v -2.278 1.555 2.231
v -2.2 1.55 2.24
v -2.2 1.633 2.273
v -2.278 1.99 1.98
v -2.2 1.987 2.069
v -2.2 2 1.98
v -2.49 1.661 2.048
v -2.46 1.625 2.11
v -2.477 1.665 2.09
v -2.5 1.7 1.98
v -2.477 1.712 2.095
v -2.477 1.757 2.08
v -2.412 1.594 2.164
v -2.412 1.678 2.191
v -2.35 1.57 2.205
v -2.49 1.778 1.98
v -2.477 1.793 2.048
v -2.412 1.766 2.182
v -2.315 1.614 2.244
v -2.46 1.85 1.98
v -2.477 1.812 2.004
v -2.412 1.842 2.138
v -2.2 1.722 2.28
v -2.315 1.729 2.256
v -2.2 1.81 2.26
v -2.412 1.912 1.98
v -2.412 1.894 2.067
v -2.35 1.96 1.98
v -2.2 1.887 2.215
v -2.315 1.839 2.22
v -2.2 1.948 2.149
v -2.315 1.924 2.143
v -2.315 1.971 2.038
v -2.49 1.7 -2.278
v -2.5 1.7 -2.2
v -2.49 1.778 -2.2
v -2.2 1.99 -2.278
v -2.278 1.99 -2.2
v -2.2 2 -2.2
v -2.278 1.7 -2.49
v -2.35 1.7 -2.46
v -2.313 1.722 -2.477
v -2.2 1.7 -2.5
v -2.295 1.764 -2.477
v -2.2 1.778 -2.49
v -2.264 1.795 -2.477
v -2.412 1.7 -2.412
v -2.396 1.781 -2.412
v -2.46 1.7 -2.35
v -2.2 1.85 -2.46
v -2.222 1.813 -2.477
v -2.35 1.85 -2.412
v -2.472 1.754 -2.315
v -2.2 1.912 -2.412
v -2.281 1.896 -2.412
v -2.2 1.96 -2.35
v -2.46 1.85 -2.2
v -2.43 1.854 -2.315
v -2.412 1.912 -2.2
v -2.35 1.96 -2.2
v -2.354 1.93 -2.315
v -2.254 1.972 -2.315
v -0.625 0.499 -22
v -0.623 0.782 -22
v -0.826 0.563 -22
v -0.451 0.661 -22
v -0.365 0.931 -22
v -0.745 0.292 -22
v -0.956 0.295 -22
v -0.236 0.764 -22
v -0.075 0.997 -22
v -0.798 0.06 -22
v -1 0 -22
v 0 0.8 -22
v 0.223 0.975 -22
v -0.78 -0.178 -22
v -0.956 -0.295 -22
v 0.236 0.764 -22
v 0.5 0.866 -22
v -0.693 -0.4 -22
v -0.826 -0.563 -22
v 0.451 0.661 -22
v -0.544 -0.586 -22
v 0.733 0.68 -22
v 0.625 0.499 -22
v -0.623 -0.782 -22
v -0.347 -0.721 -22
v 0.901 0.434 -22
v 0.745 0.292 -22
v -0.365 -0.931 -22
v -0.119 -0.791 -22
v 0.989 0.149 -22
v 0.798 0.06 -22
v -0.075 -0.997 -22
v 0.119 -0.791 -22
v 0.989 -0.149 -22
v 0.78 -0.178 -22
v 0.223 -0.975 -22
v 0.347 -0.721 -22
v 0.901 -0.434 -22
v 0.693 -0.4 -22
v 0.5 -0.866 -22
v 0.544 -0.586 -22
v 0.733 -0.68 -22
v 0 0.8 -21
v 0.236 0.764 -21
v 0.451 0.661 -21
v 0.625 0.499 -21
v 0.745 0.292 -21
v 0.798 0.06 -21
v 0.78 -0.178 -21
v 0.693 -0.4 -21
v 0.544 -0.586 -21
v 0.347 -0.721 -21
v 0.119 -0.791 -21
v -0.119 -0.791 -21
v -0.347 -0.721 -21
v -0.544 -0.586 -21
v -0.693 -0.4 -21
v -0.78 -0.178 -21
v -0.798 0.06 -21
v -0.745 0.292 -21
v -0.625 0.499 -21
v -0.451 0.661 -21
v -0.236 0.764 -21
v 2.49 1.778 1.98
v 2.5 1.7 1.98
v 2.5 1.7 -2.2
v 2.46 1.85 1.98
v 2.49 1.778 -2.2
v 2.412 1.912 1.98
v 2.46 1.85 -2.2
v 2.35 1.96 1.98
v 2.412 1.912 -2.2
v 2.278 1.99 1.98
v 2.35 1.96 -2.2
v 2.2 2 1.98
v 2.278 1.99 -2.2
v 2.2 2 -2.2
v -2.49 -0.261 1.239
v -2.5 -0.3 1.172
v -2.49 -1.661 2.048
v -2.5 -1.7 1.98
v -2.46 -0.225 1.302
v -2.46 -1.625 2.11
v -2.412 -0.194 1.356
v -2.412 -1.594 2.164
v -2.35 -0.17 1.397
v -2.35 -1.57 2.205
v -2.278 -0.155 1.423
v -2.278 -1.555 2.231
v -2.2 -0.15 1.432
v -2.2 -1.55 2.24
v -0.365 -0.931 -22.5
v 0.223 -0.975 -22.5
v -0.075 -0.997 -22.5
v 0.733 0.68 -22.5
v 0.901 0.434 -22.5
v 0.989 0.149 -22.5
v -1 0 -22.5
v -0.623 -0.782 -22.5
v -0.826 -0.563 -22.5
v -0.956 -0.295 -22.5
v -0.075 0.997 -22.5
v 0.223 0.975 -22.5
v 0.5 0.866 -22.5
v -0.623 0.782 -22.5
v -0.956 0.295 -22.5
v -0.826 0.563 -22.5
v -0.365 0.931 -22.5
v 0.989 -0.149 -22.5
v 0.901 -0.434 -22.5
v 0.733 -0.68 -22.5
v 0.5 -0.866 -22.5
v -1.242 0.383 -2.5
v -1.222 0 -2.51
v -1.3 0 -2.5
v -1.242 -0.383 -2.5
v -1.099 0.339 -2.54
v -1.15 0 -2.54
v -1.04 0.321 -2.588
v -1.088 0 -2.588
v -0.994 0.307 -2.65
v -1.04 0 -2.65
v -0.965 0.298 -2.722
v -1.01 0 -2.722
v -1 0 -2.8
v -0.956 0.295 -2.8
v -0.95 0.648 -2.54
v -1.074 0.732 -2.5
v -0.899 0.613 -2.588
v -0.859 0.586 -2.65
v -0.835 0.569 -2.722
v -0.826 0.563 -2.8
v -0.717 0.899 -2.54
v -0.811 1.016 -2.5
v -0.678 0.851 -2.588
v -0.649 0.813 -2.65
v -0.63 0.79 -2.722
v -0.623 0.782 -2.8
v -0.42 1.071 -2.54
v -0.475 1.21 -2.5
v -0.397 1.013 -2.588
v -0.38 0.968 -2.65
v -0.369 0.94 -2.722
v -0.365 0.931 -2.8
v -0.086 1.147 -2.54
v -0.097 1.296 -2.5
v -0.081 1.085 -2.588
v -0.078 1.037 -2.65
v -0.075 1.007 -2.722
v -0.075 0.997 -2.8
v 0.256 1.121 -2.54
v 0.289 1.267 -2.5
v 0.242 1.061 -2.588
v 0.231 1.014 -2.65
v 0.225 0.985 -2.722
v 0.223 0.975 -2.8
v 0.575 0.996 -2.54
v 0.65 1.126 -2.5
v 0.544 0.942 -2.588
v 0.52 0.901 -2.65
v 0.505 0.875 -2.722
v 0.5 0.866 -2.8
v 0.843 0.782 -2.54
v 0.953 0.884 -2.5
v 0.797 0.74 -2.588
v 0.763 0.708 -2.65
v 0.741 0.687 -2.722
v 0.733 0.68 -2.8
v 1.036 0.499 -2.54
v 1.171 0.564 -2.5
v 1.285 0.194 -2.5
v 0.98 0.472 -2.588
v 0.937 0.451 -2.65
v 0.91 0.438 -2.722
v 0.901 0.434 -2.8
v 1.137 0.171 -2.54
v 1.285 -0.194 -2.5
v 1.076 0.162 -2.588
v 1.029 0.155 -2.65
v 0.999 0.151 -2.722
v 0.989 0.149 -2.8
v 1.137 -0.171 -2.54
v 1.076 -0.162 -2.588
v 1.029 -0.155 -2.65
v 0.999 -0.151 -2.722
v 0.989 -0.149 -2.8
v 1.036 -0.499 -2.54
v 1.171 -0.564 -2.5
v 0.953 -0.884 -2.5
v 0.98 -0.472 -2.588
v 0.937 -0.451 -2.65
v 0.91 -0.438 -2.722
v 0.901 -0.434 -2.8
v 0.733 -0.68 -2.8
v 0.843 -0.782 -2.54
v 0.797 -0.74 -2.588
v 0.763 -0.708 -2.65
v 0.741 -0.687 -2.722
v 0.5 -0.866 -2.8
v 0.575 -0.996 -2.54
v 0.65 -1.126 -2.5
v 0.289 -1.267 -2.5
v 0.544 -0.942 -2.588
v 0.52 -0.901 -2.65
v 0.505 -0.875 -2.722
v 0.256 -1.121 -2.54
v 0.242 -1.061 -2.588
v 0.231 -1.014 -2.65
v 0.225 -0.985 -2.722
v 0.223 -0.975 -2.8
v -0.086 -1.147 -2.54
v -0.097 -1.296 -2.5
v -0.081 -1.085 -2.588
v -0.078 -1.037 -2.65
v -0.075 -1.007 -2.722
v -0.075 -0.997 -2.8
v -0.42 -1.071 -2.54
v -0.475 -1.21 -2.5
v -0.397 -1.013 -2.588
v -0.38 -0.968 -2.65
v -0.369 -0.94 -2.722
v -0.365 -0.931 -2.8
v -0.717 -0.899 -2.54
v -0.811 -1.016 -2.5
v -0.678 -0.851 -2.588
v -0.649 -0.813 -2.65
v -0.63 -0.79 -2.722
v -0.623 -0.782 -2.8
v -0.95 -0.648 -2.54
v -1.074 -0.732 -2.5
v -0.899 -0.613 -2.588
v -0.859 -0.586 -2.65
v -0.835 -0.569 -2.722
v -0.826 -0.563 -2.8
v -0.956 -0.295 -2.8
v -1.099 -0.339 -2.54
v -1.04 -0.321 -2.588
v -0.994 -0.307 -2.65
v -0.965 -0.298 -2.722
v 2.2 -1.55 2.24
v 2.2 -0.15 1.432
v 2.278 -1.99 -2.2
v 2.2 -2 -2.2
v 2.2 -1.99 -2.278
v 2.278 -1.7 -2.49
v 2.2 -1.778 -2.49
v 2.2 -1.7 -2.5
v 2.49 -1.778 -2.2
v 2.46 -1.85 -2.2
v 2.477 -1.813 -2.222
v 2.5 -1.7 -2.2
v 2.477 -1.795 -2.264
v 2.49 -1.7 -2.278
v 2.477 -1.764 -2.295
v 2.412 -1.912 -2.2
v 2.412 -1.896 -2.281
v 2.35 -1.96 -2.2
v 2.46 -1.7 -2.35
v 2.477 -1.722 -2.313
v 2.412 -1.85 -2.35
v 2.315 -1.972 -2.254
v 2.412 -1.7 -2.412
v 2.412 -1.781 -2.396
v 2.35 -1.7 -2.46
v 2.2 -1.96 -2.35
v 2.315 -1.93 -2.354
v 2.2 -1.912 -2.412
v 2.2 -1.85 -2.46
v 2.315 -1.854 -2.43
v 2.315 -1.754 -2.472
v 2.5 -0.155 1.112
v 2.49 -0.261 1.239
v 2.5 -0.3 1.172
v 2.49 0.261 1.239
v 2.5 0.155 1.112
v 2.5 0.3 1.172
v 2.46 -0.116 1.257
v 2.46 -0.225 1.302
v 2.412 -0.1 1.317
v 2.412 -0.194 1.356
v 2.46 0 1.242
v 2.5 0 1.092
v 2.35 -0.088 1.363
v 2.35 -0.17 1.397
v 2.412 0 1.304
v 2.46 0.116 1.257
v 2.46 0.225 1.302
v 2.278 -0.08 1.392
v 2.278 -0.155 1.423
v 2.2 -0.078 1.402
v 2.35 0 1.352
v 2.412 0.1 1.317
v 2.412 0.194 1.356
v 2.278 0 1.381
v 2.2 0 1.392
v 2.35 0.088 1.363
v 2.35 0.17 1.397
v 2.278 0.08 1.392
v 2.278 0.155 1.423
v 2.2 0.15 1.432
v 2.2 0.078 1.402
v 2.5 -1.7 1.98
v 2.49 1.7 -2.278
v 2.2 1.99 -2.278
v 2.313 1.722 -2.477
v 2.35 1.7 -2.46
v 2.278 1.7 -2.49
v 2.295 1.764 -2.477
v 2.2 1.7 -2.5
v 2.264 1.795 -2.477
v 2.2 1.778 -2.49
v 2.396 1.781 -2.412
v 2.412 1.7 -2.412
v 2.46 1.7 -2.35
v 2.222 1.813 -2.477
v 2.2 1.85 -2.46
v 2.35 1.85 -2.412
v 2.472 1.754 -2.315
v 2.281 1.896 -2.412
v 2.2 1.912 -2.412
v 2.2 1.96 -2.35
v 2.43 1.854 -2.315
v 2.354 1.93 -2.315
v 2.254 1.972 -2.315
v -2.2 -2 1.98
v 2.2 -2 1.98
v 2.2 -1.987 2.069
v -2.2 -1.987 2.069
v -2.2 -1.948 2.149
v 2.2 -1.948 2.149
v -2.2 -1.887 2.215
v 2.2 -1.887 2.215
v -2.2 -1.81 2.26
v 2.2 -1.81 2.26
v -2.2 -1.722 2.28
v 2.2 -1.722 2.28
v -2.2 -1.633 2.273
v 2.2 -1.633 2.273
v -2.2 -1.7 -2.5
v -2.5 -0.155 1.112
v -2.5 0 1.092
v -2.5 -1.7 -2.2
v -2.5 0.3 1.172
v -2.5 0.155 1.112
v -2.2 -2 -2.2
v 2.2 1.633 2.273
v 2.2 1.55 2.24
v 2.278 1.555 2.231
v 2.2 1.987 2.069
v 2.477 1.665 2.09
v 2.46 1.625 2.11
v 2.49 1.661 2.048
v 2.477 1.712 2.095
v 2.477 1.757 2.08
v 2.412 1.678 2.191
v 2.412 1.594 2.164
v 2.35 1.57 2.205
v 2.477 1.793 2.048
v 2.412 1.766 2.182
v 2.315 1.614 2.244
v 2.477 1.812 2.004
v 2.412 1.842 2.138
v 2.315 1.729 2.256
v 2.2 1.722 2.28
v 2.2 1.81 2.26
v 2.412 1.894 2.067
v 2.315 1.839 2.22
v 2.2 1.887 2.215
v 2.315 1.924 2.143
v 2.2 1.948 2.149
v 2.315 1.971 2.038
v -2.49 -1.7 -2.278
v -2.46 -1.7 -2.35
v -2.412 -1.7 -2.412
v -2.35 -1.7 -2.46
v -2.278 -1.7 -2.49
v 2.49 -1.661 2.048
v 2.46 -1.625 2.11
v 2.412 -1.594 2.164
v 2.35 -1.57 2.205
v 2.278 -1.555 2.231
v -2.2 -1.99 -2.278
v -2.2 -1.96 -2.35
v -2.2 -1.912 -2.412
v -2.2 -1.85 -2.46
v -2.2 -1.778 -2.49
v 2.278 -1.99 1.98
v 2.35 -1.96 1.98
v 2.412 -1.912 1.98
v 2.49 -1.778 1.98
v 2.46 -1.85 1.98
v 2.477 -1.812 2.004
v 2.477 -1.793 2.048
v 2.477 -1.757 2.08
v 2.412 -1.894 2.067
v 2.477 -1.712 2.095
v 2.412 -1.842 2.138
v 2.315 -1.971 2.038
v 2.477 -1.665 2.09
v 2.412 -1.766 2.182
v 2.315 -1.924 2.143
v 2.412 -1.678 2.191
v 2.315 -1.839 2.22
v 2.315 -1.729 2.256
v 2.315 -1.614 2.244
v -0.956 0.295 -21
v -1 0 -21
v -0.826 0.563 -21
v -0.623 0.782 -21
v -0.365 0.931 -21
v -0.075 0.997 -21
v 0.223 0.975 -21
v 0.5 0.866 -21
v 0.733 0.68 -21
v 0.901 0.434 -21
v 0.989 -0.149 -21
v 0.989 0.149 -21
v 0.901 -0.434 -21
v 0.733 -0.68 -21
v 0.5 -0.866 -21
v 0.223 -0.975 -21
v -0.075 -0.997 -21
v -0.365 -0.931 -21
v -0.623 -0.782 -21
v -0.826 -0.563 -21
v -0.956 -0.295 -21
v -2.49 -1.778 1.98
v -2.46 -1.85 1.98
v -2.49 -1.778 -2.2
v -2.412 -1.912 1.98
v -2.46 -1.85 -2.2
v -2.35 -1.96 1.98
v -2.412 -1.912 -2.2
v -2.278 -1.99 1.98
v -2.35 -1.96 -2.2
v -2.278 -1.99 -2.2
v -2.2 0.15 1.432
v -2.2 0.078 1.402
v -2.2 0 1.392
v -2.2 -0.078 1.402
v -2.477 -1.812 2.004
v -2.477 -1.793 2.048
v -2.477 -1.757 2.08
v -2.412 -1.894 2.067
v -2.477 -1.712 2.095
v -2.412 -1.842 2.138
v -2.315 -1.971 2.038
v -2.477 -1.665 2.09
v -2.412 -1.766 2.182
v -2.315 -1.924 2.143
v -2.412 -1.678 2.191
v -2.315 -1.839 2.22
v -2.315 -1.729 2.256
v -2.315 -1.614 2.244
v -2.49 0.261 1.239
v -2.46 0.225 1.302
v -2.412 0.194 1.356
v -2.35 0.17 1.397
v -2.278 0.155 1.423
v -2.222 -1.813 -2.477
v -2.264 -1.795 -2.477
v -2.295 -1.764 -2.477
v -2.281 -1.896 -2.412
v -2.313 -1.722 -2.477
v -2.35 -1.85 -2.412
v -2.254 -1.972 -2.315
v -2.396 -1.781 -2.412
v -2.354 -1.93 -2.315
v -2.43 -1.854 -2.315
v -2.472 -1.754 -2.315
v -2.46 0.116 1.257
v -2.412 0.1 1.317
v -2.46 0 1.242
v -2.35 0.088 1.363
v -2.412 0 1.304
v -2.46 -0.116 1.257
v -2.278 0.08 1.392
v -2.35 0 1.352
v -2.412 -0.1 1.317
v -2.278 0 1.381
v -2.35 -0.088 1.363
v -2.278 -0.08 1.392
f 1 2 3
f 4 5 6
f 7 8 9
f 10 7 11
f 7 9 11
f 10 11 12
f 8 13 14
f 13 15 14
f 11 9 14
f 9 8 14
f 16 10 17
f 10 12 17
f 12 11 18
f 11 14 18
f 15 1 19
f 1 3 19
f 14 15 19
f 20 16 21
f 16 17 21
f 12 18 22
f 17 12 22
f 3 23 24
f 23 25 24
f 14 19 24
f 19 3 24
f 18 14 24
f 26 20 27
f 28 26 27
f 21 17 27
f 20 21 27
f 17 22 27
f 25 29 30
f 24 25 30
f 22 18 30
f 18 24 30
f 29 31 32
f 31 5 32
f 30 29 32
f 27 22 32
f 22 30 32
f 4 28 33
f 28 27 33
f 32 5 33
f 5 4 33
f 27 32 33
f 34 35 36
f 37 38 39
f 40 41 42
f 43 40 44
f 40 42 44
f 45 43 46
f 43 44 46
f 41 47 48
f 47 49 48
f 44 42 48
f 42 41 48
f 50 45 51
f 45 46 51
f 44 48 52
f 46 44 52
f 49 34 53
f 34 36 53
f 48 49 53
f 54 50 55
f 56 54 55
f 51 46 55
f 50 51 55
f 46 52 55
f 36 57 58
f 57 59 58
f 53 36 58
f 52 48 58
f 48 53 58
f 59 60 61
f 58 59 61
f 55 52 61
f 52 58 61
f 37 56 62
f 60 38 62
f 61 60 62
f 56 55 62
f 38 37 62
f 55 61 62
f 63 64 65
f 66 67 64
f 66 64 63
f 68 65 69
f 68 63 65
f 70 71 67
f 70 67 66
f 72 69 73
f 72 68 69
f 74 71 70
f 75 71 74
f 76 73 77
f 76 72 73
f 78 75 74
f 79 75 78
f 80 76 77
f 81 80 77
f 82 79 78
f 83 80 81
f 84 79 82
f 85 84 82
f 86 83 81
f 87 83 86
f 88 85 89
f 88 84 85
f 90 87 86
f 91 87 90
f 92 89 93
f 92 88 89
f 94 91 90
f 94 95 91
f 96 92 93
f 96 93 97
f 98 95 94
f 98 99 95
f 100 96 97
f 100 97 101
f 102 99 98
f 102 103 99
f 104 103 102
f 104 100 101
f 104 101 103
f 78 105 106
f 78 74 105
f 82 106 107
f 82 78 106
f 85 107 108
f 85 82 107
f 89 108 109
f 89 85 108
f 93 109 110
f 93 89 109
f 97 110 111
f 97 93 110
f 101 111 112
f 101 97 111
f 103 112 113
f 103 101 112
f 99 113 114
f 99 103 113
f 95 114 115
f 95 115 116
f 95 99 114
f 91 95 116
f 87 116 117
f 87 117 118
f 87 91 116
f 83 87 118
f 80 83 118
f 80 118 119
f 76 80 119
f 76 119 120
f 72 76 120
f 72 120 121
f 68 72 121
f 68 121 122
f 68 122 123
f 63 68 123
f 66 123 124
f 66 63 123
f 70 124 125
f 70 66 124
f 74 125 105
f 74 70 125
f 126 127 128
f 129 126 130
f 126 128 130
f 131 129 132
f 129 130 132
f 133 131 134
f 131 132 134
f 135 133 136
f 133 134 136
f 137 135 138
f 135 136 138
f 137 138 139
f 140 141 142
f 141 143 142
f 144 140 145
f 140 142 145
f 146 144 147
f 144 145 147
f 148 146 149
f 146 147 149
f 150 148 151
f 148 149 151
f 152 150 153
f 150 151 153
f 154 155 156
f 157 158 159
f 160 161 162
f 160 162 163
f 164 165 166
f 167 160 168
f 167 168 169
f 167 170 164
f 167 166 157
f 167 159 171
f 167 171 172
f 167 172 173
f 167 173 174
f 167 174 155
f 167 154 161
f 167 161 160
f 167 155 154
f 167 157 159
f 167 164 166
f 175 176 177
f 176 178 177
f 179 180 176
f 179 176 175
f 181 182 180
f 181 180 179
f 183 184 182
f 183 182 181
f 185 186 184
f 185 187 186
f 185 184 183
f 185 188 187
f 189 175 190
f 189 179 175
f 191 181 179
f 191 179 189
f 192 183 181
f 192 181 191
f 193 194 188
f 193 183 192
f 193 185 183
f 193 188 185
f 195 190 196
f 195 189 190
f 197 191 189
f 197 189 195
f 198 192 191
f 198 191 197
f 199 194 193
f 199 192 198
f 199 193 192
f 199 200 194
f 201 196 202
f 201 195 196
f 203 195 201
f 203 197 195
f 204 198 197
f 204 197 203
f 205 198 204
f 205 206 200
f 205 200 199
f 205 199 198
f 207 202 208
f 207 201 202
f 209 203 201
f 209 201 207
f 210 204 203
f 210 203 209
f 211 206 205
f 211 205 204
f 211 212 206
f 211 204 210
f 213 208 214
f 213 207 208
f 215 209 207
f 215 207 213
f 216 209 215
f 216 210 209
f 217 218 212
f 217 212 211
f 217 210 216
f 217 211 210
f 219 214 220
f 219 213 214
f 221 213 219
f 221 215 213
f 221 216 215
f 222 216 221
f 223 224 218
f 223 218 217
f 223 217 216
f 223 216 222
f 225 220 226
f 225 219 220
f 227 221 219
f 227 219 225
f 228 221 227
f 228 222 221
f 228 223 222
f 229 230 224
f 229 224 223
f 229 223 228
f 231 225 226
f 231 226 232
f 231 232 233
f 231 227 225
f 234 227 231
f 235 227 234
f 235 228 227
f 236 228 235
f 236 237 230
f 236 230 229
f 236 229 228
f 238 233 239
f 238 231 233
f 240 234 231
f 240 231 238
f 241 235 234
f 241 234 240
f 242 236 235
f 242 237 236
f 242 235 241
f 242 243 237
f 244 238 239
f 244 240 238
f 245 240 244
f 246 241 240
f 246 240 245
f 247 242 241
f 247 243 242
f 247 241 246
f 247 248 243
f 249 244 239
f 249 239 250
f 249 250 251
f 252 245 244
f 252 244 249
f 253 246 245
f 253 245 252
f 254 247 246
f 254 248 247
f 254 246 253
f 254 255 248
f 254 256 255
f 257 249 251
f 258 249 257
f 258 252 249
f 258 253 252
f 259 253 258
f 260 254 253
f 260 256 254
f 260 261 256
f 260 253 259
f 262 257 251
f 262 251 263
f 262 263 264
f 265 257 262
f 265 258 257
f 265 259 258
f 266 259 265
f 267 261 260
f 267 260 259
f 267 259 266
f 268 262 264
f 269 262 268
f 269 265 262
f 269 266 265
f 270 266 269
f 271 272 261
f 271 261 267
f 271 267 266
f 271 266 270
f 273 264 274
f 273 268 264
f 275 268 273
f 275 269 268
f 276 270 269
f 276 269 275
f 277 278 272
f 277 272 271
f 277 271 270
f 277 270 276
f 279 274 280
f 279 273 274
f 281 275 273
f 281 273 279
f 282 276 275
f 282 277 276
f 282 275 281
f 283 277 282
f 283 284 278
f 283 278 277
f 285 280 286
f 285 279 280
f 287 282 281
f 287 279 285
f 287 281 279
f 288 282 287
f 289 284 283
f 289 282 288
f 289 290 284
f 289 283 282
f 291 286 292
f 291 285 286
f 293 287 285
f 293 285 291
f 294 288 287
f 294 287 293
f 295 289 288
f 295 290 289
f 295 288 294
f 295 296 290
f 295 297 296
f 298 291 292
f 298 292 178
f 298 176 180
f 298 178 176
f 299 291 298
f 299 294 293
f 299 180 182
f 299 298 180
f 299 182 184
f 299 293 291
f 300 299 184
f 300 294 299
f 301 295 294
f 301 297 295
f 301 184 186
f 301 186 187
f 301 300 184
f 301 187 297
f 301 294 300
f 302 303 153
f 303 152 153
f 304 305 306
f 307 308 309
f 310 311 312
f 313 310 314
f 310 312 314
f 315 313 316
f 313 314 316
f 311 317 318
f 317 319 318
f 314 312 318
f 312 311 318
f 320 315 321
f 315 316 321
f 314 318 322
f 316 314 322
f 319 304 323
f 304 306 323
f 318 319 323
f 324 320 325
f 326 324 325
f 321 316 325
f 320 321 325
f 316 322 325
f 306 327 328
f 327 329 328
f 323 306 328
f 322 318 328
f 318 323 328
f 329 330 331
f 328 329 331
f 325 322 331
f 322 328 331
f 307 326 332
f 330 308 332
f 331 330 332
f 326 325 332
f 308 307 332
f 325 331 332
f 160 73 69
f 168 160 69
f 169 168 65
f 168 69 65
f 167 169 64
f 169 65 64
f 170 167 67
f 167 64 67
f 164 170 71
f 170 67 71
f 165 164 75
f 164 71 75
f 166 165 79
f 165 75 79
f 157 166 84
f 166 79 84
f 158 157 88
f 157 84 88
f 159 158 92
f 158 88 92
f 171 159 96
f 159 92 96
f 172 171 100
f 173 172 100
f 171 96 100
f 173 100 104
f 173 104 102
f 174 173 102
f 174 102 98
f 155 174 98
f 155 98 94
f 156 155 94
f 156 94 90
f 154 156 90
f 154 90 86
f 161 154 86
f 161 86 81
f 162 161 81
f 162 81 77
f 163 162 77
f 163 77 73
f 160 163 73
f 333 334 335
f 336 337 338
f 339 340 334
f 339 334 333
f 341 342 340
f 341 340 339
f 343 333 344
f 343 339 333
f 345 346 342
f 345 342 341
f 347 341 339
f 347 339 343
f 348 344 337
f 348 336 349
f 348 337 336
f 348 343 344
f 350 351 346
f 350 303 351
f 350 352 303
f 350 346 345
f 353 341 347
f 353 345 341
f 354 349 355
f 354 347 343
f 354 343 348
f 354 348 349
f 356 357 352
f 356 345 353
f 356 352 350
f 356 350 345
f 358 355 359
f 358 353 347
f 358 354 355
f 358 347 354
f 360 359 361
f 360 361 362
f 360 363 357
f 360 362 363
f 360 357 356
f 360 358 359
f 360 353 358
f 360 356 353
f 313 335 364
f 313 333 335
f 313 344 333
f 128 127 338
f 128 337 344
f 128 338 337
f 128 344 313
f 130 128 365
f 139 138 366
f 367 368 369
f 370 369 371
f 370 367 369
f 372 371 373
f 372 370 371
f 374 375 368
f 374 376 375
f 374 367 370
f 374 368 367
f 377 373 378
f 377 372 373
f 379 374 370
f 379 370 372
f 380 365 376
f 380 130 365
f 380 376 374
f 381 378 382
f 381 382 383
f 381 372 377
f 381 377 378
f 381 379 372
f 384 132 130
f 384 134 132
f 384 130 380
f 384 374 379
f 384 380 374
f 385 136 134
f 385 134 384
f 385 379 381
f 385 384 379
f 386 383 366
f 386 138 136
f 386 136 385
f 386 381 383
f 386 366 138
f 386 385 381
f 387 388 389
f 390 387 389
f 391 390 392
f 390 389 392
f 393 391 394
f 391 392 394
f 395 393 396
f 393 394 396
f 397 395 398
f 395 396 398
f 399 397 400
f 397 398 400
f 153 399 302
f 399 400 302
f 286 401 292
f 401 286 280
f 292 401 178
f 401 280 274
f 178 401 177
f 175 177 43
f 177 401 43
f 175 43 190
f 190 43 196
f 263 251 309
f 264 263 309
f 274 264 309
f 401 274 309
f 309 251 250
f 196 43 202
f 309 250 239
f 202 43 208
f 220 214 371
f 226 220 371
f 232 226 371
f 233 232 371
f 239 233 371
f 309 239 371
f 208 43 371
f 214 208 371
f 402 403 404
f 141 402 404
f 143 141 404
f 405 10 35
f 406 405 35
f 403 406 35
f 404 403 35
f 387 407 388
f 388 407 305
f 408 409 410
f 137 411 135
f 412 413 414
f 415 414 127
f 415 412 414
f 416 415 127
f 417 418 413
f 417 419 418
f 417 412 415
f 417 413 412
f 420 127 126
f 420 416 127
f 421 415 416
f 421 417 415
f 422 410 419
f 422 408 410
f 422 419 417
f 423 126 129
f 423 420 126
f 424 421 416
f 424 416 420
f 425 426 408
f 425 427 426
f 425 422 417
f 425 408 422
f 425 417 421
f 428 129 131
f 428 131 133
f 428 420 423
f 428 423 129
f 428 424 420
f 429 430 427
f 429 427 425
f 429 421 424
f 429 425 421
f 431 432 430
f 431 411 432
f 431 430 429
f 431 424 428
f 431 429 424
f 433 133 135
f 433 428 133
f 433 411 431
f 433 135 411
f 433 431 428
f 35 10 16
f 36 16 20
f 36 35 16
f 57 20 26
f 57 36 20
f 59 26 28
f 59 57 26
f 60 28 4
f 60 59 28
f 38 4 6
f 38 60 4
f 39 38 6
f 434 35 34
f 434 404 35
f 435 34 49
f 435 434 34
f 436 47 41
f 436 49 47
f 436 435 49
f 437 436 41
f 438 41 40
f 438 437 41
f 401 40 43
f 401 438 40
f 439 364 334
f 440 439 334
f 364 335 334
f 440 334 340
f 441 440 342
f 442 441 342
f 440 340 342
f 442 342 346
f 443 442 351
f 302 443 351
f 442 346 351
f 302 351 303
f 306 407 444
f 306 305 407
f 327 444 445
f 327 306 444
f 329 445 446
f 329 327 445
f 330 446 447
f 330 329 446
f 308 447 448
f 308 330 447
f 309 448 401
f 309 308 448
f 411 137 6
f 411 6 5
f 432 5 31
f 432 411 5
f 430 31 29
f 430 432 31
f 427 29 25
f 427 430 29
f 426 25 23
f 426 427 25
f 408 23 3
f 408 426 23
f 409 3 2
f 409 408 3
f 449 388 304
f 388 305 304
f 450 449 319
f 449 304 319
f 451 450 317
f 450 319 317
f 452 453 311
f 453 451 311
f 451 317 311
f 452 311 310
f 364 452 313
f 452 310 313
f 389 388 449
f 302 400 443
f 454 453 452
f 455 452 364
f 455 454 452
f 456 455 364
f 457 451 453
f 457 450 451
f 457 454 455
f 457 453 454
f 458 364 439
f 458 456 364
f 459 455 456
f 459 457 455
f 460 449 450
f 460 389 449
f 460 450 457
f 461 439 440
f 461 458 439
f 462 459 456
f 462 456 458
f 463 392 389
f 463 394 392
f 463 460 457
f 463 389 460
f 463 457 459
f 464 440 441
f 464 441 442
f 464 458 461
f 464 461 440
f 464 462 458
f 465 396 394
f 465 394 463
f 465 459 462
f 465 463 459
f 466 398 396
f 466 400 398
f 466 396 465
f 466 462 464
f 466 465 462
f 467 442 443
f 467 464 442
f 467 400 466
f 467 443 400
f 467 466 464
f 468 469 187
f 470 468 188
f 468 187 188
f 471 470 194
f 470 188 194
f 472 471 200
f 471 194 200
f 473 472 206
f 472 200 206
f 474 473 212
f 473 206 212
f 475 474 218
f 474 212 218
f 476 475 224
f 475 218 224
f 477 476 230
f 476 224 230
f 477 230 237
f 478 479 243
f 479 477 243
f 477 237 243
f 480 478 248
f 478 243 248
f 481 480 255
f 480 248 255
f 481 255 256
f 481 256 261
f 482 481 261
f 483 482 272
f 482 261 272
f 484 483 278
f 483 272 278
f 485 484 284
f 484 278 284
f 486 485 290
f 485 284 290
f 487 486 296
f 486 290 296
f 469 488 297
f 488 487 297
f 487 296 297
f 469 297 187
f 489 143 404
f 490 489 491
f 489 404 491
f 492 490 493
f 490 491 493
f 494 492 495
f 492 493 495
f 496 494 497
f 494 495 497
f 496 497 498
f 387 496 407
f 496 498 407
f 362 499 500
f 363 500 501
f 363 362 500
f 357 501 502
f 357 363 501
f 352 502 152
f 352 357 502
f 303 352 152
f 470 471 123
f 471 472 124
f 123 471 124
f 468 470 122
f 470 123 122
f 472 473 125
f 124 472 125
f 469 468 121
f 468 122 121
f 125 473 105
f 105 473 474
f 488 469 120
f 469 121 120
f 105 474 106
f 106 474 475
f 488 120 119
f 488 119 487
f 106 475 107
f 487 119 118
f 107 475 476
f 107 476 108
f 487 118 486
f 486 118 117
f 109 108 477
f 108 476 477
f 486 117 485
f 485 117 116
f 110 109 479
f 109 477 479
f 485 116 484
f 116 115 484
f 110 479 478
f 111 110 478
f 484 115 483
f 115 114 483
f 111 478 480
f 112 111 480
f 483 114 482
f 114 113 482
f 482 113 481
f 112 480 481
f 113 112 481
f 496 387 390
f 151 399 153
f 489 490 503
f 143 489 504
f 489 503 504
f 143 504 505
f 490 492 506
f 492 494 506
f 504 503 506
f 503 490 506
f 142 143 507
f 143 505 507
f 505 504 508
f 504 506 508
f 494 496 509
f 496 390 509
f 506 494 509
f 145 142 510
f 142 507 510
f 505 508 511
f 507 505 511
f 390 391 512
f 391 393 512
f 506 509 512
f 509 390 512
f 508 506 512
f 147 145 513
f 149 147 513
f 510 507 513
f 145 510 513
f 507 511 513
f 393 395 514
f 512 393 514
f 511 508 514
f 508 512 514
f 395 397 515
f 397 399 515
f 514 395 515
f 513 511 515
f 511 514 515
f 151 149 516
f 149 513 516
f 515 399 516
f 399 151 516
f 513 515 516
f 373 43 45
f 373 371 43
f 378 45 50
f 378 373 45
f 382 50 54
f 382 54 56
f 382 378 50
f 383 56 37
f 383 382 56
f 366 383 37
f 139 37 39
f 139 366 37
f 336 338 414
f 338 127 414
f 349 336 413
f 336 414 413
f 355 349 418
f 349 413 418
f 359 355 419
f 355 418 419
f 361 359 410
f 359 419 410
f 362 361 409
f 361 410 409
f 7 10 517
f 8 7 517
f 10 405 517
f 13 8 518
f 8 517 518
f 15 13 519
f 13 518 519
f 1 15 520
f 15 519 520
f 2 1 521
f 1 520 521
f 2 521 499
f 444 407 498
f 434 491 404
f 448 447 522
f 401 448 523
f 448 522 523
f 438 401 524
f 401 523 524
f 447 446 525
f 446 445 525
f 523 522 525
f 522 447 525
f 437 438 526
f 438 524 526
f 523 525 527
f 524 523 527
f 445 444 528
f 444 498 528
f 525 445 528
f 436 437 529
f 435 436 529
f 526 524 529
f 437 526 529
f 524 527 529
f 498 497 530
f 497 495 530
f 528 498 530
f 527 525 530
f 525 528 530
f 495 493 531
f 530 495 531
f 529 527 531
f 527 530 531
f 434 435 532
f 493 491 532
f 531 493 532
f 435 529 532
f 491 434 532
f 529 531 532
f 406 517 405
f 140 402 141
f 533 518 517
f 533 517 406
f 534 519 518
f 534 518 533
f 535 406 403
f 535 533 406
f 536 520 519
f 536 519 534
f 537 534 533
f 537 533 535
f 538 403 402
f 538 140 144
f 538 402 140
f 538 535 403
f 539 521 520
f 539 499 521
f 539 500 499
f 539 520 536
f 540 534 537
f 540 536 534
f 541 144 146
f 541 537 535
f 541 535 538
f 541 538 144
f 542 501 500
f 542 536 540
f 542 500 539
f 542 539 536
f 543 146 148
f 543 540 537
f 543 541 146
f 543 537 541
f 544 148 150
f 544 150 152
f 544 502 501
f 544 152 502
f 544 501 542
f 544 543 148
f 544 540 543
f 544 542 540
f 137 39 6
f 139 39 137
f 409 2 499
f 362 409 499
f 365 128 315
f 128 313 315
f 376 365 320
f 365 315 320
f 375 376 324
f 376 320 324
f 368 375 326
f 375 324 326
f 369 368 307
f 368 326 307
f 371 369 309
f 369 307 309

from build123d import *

# Parameters (mm, degrees)
ESQUISSE1_W             = 5
ESQUISSE1_H             = 5
BOSS_EXTRU_1_DEPTH      = 2
ENL_V_MAT_EXTRU_1_DEPTH = 6
ESQUISSE3_R             = 1
BOSS_EXTRU_2_DEPTH      = 20
ESQUISSE4_W             = 1
ESQUISSE4_H             = 0.2
CONG_3_R                = 0.3


with BuildPart() as part:
    # Esquisse1 → Boss.-Extru.1 (new body, symmetric)
    with BuildSketch(Plane(origin=(0, 0, 0), x_dir=(1, 0, 0), z_dir=(0, 1, 0))):
        Rectangle(ESQUISSE1_W, ESQUISSE1_H)
    extrude(amount=BOSS_EXTRU_1_DEPTH, both=True)

    # Esquisse2 → Enlèv. mat.-Extru.1 (cut, through all)
    with BuildSketch(Plane.ZY.offset(2.5)):
        Polygon((2.5, 2), (1.345299462, 0), (2.5, -2), align=None)
    extrude(amount=-ENL_V_MAT_EXTRU_1_DEPTH, mode=Mode.SUBTRACT)

    # Esquisse3 → Boss.-Extru.2 (add)
    with BuildSketch(Plane(origin=(0, 0, -2.5), x_dir=(-1, 0, 0), z_dir=(0, 0, -1))):
        Circle(ESQUISSE3_R)
    extrude(amount=BOSS_EXTRU_2_DEPTH)

    # Esquisse4 → Enlèvement de matière-Révolution1 (revolve, cut)
    with BuildSketch(Plane(origin=(0, 0, 0), x_dir=(0, 0, -1), z_dir=(1, 0, 0))):
        with Locations((21.5, 0.9)):
            Rectangle(ESQUISSE4_W, ESQUISSE4_H)
    revolve(axis=Axis((0, 0, -23.5), (0, 0, -1)), mode=Mode.SUBTRACT)

    # Congé3
    cong_3_edges = [part.edges().sort_by_distance(p)[0] for p in [
        (-2.5, 2, 0),
        (0, 2, 2.5),
        (2.5, -1, 1.922649731),
        (2.5, 1, 1.922649731),
        (0, 0, 1.345299462),
        (-2.5, 1, 1.922649731),
        (-2.5, -1, 1.922649731),
        (1, 0, -2.5),
        (2.5, 2, 0),
        (0, -2, 2.5),
        (-2.5, -2, 0),
        (0, -2, -2.5),
        (2.5, -2, 0),
        (-2.5, 0, -2.5),
        (2.5, 0, -2.5),
        (0, 2, -2.5),
    ]]
    fillet(cong_3_edges, radius=CONG_3_R)


solid = part.part
